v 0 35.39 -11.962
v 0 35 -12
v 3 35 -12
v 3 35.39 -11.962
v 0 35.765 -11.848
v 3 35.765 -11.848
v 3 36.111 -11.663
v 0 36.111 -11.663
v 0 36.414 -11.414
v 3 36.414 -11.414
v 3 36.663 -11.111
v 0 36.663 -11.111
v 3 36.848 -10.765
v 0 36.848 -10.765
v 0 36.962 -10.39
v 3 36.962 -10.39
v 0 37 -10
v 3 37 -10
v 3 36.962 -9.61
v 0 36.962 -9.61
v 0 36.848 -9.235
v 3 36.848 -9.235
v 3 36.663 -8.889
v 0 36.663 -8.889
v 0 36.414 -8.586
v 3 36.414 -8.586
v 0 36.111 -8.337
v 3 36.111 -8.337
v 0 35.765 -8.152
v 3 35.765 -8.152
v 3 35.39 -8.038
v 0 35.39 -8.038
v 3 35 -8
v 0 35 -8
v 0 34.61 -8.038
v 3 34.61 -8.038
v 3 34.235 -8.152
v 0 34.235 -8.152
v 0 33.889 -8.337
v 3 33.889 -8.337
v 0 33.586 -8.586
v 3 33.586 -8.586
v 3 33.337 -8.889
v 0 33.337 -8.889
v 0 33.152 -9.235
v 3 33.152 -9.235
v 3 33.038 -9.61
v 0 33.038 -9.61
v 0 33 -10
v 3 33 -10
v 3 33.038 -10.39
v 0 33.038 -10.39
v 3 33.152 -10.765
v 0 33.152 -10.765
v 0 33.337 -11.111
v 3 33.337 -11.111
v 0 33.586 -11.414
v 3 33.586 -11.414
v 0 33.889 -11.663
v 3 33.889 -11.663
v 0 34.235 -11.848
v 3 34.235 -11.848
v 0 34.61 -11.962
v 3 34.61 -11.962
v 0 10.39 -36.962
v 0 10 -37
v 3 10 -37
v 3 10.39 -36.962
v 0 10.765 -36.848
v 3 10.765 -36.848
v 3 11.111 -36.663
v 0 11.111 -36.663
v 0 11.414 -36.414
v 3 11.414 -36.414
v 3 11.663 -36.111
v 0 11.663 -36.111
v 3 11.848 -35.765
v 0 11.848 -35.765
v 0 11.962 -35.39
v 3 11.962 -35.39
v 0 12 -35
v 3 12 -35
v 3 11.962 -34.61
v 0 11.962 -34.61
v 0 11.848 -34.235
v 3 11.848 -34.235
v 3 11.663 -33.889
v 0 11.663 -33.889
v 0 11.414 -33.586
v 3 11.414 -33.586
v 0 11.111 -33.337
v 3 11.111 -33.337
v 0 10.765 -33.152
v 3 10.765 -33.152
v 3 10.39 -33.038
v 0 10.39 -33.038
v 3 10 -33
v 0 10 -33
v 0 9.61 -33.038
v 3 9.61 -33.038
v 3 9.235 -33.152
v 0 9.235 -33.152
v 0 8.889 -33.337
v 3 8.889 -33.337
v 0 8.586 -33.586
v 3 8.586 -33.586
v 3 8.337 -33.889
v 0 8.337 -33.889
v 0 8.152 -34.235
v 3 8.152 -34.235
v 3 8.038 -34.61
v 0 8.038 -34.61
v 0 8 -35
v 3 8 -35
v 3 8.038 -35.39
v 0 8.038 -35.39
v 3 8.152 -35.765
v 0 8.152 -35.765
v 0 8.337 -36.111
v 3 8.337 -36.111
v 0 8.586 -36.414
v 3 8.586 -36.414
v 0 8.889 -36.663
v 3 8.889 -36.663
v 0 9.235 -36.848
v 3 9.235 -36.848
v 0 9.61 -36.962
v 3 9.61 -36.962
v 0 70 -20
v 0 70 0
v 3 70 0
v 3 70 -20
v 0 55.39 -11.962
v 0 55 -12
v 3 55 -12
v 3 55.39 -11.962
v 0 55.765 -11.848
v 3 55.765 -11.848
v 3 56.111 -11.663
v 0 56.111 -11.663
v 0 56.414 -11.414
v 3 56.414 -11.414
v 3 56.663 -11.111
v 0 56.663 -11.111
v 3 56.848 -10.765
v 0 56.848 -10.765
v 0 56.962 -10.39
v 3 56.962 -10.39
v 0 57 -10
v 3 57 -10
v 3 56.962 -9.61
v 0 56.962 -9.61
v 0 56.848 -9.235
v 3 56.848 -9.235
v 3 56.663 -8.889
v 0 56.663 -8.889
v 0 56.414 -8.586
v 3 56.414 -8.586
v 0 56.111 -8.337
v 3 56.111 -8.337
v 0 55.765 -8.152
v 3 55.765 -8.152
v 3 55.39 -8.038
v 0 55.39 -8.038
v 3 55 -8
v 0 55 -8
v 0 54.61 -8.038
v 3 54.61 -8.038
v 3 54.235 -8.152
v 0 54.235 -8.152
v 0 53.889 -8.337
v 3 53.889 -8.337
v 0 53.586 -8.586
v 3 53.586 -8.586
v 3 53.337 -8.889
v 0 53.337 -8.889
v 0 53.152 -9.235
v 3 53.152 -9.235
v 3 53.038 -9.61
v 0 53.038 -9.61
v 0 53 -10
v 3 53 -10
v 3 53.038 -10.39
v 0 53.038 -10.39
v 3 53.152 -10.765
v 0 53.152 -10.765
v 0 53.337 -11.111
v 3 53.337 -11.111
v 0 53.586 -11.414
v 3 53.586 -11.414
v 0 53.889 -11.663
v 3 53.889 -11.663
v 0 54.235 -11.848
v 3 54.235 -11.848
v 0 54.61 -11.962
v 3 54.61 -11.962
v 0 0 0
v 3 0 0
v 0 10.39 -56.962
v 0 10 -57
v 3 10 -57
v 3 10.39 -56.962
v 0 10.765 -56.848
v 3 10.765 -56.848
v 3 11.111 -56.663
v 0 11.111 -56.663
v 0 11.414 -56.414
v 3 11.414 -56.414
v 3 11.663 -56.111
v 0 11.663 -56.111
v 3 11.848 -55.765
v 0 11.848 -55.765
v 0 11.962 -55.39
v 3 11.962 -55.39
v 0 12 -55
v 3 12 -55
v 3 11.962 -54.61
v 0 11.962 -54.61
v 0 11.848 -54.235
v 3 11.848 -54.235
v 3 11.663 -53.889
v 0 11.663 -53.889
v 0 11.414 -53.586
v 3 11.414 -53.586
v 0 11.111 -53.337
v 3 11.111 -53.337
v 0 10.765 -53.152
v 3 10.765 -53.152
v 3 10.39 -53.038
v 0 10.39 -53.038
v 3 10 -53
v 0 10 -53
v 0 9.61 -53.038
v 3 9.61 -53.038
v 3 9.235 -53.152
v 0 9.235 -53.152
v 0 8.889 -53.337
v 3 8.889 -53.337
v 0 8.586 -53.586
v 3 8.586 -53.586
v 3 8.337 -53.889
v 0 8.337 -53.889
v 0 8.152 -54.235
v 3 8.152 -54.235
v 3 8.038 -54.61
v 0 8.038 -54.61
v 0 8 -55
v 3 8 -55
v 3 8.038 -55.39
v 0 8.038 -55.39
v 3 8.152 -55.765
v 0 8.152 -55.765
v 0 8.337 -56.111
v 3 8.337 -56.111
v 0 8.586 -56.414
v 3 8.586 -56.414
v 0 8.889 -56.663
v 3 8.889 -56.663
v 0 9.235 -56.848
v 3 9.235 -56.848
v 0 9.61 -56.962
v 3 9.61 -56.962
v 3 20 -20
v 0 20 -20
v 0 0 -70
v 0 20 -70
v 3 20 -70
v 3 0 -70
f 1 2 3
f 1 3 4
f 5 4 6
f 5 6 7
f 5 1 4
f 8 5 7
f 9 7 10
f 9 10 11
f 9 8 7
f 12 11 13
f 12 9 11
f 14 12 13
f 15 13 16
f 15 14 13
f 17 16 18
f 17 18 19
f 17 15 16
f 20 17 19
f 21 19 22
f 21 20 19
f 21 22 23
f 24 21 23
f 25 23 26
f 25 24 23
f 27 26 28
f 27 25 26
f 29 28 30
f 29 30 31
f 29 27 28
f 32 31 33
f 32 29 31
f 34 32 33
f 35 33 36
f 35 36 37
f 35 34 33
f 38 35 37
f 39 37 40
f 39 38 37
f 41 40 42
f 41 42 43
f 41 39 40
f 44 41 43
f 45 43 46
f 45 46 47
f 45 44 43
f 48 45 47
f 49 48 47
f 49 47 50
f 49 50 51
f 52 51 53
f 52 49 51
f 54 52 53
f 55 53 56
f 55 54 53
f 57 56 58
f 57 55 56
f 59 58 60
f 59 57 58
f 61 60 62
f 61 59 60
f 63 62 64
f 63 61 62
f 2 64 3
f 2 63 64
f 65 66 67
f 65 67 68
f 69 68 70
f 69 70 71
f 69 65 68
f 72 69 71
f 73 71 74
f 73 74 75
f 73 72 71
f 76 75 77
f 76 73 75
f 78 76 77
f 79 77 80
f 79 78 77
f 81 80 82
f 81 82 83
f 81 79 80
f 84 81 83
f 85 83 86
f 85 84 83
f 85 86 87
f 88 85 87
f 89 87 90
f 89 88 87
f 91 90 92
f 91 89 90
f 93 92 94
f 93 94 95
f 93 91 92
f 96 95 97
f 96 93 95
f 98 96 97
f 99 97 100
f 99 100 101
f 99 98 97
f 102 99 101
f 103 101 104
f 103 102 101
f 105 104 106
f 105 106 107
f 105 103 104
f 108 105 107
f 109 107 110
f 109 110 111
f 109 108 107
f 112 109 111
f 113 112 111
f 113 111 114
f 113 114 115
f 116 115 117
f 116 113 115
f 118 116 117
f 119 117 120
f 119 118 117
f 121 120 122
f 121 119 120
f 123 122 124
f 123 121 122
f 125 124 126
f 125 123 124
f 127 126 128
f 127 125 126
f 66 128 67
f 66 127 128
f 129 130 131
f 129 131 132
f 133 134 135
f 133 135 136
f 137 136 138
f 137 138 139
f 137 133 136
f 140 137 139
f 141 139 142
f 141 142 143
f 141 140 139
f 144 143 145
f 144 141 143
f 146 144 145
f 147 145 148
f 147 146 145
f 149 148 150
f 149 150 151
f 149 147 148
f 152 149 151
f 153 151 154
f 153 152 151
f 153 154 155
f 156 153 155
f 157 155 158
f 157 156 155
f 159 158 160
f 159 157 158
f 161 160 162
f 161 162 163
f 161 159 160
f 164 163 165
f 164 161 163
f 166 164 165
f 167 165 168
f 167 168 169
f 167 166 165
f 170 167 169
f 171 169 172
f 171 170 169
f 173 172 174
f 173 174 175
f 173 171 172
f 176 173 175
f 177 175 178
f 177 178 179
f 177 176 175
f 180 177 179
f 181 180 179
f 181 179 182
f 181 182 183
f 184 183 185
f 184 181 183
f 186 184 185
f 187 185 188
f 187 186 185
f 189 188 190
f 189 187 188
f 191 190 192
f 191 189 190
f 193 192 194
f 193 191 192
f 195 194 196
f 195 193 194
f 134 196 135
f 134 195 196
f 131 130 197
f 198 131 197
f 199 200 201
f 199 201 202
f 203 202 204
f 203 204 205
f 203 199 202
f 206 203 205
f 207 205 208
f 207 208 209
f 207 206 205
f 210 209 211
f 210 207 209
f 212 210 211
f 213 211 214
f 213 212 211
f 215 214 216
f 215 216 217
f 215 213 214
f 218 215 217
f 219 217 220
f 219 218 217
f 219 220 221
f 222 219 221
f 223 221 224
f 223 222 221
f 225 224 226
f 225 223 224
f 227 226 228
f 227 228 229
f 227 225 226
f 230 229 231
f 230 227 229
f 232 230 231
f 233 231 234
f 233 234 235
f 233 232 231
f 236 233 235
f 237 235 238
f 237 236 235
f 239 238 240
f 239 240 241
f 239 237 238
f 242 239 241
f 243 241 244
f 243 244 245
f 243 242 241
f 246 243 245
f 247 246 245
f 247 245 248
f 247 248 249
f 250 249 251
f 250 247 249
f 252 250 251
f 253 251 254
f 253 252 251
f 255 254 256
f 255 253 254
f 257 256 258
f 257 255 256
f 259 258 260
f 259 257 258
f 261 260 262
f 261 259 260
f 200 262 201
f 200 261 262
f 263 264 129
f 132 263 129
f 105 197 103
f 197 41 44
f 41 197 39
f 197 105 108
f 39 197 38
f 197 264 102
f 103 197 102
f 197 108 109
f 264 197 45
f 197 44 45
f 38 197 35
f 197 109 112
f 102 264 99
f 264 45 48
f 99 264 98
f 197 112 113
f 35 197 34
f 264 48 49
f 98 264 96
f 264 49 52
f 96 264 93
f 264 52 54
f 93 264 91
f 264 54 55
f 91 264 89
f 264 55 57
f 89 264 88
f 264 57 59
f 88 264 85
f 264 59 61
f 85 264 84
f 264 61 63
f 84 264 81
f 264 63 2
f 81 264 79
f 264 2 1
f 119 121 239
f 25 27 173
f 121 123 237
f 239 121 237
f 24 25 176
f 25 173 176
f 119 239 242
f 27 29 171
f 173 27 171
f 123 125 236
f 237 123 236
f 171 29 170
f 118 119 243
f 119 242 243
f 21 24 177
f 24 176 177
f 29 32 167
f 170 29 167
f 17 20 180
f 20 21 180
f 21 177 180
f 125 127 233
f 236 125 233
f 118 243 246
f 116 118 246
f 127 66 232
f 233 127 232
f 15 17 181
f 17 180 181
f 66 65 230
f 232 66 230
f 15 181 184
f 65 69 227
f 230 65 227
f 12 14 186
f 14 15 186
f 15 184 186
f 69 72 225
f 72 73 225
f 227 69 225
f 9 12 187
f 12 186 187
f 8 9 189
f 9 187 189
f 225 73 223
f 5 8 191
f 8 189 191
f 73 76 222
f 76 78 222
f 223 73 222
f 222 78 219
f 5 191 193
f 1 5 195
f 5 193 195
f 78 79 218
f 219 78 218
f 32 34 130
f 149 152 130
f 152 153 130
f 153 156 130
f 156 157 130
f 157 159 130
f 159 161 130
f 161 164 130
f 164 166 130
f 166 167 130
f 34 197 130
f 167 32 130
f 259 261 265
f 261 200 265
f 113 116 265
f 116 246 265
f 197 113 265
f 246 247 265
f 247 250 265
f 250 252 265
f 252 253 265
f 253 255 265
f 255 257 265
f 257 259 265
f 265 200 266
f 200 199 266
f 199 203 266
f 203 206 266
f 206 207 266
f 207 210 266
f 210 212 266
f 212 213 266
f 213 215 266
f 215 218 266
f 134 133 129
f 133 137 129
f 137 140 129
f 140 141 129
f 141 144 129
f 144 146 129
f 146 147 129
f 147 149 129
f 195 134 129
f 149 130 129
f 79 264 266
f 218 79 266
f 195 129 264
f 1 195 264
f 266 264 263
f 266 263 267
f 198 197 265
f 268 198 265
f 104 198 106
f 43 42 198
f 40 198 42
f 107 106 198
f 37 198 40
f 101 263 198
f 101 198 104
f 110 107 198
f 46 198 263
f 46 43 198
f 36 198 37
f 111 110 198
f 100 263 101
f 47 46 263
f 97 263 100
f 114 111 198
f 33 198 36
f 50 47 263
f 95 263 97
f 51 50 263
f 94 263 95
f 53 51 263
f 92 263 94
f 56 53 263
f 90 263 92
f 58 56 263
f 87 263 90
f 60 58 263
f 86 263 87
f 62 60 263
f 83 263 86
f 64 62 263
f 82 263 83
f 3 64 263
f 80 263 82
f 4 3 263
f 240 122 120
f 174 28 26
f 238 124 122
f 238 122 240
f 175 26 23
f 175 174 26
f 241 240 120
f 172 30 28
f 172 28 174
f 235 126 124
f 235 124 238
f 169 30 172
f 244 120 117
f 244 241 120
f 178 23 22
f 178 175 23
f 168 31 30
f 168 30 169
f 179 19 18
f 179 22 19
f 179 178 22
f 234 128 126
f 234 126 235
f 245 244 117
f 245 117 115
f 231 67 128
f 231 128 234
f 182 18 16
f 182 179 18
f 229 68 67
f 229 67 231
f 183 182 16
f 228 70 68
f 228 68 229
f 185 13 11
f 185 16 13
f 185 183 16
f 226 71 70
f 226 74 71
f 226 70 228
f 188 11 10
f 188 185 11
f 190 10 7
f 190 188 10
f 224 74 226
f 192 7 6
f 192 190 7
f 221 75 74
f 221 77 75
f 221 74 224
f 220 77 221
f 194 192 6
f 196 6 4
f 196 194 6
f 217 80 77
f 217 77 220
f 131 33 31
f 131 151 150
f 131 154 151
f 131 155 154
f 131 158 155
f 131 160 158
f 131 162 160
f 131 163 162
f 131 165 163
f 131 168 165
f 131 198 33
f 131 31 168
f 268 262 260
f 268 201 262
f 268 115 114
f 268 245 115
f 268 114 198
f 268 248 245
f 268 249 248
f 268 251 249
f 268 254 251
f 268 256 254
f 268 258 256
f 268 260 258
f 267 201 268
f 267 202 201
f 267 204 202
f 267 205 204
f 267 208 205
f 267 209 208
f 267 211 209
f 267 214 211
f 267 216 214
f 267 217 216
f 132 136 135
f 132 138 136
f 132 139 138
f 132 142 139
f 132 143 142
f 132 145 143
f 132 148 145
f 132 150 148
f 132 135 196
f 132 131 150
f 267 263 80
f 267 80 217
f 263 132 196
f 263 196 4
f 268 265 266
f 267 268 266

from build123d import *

# Parameters (mm, degrees)
ESBO_O1_W                = 20
ESBO_O1_H                = 50
ESBO_O1_R                = 2
ESBO_O1_W_2              = 50
ESBO_O1_H_2              = 20
RESSALTO_EXTRUS_O1_DEPTH = 3


with BuildPart() as part:
    # Esboço1 → Ressalto-extrusão1 (new body)
    with BuildSketch(Plane(origin=(0, 0, 0), x_dir=(0, 0, -1), z_dir=(1, 0, 0))):
        with Locations((10, 45)):
            Rectangle(ESBO_O1_W, ESBO_O1_H)
        with Locations((10, 35)):
            Circle(ESBO_O1_R, mode=Mode.SUBTRACT)
        with Locations((10, 55)):
            Circle(ESBO_O1_R, mode=Mode.SUBTRACT)
        with Locations((45, 10)):
            Rectangle(ESBO_O1_W_2, ESBO_O1_H_2)
        with Locations((35, 10)):
            Circle(ESBO_O1_R, mode=Mode.SUBTRACT)
        with Locations((55, 10)):
            Circle(ESBO_O1_R, mode=Mode.SUBTRACT)
        with Locations((10, 10)):
            Rectangle(ESBO_O1_W, ESBO_O1_H_2)
    extrude(amount=RESSALTO_EXTRUS_O1_DEPTH)


solid = part.part
